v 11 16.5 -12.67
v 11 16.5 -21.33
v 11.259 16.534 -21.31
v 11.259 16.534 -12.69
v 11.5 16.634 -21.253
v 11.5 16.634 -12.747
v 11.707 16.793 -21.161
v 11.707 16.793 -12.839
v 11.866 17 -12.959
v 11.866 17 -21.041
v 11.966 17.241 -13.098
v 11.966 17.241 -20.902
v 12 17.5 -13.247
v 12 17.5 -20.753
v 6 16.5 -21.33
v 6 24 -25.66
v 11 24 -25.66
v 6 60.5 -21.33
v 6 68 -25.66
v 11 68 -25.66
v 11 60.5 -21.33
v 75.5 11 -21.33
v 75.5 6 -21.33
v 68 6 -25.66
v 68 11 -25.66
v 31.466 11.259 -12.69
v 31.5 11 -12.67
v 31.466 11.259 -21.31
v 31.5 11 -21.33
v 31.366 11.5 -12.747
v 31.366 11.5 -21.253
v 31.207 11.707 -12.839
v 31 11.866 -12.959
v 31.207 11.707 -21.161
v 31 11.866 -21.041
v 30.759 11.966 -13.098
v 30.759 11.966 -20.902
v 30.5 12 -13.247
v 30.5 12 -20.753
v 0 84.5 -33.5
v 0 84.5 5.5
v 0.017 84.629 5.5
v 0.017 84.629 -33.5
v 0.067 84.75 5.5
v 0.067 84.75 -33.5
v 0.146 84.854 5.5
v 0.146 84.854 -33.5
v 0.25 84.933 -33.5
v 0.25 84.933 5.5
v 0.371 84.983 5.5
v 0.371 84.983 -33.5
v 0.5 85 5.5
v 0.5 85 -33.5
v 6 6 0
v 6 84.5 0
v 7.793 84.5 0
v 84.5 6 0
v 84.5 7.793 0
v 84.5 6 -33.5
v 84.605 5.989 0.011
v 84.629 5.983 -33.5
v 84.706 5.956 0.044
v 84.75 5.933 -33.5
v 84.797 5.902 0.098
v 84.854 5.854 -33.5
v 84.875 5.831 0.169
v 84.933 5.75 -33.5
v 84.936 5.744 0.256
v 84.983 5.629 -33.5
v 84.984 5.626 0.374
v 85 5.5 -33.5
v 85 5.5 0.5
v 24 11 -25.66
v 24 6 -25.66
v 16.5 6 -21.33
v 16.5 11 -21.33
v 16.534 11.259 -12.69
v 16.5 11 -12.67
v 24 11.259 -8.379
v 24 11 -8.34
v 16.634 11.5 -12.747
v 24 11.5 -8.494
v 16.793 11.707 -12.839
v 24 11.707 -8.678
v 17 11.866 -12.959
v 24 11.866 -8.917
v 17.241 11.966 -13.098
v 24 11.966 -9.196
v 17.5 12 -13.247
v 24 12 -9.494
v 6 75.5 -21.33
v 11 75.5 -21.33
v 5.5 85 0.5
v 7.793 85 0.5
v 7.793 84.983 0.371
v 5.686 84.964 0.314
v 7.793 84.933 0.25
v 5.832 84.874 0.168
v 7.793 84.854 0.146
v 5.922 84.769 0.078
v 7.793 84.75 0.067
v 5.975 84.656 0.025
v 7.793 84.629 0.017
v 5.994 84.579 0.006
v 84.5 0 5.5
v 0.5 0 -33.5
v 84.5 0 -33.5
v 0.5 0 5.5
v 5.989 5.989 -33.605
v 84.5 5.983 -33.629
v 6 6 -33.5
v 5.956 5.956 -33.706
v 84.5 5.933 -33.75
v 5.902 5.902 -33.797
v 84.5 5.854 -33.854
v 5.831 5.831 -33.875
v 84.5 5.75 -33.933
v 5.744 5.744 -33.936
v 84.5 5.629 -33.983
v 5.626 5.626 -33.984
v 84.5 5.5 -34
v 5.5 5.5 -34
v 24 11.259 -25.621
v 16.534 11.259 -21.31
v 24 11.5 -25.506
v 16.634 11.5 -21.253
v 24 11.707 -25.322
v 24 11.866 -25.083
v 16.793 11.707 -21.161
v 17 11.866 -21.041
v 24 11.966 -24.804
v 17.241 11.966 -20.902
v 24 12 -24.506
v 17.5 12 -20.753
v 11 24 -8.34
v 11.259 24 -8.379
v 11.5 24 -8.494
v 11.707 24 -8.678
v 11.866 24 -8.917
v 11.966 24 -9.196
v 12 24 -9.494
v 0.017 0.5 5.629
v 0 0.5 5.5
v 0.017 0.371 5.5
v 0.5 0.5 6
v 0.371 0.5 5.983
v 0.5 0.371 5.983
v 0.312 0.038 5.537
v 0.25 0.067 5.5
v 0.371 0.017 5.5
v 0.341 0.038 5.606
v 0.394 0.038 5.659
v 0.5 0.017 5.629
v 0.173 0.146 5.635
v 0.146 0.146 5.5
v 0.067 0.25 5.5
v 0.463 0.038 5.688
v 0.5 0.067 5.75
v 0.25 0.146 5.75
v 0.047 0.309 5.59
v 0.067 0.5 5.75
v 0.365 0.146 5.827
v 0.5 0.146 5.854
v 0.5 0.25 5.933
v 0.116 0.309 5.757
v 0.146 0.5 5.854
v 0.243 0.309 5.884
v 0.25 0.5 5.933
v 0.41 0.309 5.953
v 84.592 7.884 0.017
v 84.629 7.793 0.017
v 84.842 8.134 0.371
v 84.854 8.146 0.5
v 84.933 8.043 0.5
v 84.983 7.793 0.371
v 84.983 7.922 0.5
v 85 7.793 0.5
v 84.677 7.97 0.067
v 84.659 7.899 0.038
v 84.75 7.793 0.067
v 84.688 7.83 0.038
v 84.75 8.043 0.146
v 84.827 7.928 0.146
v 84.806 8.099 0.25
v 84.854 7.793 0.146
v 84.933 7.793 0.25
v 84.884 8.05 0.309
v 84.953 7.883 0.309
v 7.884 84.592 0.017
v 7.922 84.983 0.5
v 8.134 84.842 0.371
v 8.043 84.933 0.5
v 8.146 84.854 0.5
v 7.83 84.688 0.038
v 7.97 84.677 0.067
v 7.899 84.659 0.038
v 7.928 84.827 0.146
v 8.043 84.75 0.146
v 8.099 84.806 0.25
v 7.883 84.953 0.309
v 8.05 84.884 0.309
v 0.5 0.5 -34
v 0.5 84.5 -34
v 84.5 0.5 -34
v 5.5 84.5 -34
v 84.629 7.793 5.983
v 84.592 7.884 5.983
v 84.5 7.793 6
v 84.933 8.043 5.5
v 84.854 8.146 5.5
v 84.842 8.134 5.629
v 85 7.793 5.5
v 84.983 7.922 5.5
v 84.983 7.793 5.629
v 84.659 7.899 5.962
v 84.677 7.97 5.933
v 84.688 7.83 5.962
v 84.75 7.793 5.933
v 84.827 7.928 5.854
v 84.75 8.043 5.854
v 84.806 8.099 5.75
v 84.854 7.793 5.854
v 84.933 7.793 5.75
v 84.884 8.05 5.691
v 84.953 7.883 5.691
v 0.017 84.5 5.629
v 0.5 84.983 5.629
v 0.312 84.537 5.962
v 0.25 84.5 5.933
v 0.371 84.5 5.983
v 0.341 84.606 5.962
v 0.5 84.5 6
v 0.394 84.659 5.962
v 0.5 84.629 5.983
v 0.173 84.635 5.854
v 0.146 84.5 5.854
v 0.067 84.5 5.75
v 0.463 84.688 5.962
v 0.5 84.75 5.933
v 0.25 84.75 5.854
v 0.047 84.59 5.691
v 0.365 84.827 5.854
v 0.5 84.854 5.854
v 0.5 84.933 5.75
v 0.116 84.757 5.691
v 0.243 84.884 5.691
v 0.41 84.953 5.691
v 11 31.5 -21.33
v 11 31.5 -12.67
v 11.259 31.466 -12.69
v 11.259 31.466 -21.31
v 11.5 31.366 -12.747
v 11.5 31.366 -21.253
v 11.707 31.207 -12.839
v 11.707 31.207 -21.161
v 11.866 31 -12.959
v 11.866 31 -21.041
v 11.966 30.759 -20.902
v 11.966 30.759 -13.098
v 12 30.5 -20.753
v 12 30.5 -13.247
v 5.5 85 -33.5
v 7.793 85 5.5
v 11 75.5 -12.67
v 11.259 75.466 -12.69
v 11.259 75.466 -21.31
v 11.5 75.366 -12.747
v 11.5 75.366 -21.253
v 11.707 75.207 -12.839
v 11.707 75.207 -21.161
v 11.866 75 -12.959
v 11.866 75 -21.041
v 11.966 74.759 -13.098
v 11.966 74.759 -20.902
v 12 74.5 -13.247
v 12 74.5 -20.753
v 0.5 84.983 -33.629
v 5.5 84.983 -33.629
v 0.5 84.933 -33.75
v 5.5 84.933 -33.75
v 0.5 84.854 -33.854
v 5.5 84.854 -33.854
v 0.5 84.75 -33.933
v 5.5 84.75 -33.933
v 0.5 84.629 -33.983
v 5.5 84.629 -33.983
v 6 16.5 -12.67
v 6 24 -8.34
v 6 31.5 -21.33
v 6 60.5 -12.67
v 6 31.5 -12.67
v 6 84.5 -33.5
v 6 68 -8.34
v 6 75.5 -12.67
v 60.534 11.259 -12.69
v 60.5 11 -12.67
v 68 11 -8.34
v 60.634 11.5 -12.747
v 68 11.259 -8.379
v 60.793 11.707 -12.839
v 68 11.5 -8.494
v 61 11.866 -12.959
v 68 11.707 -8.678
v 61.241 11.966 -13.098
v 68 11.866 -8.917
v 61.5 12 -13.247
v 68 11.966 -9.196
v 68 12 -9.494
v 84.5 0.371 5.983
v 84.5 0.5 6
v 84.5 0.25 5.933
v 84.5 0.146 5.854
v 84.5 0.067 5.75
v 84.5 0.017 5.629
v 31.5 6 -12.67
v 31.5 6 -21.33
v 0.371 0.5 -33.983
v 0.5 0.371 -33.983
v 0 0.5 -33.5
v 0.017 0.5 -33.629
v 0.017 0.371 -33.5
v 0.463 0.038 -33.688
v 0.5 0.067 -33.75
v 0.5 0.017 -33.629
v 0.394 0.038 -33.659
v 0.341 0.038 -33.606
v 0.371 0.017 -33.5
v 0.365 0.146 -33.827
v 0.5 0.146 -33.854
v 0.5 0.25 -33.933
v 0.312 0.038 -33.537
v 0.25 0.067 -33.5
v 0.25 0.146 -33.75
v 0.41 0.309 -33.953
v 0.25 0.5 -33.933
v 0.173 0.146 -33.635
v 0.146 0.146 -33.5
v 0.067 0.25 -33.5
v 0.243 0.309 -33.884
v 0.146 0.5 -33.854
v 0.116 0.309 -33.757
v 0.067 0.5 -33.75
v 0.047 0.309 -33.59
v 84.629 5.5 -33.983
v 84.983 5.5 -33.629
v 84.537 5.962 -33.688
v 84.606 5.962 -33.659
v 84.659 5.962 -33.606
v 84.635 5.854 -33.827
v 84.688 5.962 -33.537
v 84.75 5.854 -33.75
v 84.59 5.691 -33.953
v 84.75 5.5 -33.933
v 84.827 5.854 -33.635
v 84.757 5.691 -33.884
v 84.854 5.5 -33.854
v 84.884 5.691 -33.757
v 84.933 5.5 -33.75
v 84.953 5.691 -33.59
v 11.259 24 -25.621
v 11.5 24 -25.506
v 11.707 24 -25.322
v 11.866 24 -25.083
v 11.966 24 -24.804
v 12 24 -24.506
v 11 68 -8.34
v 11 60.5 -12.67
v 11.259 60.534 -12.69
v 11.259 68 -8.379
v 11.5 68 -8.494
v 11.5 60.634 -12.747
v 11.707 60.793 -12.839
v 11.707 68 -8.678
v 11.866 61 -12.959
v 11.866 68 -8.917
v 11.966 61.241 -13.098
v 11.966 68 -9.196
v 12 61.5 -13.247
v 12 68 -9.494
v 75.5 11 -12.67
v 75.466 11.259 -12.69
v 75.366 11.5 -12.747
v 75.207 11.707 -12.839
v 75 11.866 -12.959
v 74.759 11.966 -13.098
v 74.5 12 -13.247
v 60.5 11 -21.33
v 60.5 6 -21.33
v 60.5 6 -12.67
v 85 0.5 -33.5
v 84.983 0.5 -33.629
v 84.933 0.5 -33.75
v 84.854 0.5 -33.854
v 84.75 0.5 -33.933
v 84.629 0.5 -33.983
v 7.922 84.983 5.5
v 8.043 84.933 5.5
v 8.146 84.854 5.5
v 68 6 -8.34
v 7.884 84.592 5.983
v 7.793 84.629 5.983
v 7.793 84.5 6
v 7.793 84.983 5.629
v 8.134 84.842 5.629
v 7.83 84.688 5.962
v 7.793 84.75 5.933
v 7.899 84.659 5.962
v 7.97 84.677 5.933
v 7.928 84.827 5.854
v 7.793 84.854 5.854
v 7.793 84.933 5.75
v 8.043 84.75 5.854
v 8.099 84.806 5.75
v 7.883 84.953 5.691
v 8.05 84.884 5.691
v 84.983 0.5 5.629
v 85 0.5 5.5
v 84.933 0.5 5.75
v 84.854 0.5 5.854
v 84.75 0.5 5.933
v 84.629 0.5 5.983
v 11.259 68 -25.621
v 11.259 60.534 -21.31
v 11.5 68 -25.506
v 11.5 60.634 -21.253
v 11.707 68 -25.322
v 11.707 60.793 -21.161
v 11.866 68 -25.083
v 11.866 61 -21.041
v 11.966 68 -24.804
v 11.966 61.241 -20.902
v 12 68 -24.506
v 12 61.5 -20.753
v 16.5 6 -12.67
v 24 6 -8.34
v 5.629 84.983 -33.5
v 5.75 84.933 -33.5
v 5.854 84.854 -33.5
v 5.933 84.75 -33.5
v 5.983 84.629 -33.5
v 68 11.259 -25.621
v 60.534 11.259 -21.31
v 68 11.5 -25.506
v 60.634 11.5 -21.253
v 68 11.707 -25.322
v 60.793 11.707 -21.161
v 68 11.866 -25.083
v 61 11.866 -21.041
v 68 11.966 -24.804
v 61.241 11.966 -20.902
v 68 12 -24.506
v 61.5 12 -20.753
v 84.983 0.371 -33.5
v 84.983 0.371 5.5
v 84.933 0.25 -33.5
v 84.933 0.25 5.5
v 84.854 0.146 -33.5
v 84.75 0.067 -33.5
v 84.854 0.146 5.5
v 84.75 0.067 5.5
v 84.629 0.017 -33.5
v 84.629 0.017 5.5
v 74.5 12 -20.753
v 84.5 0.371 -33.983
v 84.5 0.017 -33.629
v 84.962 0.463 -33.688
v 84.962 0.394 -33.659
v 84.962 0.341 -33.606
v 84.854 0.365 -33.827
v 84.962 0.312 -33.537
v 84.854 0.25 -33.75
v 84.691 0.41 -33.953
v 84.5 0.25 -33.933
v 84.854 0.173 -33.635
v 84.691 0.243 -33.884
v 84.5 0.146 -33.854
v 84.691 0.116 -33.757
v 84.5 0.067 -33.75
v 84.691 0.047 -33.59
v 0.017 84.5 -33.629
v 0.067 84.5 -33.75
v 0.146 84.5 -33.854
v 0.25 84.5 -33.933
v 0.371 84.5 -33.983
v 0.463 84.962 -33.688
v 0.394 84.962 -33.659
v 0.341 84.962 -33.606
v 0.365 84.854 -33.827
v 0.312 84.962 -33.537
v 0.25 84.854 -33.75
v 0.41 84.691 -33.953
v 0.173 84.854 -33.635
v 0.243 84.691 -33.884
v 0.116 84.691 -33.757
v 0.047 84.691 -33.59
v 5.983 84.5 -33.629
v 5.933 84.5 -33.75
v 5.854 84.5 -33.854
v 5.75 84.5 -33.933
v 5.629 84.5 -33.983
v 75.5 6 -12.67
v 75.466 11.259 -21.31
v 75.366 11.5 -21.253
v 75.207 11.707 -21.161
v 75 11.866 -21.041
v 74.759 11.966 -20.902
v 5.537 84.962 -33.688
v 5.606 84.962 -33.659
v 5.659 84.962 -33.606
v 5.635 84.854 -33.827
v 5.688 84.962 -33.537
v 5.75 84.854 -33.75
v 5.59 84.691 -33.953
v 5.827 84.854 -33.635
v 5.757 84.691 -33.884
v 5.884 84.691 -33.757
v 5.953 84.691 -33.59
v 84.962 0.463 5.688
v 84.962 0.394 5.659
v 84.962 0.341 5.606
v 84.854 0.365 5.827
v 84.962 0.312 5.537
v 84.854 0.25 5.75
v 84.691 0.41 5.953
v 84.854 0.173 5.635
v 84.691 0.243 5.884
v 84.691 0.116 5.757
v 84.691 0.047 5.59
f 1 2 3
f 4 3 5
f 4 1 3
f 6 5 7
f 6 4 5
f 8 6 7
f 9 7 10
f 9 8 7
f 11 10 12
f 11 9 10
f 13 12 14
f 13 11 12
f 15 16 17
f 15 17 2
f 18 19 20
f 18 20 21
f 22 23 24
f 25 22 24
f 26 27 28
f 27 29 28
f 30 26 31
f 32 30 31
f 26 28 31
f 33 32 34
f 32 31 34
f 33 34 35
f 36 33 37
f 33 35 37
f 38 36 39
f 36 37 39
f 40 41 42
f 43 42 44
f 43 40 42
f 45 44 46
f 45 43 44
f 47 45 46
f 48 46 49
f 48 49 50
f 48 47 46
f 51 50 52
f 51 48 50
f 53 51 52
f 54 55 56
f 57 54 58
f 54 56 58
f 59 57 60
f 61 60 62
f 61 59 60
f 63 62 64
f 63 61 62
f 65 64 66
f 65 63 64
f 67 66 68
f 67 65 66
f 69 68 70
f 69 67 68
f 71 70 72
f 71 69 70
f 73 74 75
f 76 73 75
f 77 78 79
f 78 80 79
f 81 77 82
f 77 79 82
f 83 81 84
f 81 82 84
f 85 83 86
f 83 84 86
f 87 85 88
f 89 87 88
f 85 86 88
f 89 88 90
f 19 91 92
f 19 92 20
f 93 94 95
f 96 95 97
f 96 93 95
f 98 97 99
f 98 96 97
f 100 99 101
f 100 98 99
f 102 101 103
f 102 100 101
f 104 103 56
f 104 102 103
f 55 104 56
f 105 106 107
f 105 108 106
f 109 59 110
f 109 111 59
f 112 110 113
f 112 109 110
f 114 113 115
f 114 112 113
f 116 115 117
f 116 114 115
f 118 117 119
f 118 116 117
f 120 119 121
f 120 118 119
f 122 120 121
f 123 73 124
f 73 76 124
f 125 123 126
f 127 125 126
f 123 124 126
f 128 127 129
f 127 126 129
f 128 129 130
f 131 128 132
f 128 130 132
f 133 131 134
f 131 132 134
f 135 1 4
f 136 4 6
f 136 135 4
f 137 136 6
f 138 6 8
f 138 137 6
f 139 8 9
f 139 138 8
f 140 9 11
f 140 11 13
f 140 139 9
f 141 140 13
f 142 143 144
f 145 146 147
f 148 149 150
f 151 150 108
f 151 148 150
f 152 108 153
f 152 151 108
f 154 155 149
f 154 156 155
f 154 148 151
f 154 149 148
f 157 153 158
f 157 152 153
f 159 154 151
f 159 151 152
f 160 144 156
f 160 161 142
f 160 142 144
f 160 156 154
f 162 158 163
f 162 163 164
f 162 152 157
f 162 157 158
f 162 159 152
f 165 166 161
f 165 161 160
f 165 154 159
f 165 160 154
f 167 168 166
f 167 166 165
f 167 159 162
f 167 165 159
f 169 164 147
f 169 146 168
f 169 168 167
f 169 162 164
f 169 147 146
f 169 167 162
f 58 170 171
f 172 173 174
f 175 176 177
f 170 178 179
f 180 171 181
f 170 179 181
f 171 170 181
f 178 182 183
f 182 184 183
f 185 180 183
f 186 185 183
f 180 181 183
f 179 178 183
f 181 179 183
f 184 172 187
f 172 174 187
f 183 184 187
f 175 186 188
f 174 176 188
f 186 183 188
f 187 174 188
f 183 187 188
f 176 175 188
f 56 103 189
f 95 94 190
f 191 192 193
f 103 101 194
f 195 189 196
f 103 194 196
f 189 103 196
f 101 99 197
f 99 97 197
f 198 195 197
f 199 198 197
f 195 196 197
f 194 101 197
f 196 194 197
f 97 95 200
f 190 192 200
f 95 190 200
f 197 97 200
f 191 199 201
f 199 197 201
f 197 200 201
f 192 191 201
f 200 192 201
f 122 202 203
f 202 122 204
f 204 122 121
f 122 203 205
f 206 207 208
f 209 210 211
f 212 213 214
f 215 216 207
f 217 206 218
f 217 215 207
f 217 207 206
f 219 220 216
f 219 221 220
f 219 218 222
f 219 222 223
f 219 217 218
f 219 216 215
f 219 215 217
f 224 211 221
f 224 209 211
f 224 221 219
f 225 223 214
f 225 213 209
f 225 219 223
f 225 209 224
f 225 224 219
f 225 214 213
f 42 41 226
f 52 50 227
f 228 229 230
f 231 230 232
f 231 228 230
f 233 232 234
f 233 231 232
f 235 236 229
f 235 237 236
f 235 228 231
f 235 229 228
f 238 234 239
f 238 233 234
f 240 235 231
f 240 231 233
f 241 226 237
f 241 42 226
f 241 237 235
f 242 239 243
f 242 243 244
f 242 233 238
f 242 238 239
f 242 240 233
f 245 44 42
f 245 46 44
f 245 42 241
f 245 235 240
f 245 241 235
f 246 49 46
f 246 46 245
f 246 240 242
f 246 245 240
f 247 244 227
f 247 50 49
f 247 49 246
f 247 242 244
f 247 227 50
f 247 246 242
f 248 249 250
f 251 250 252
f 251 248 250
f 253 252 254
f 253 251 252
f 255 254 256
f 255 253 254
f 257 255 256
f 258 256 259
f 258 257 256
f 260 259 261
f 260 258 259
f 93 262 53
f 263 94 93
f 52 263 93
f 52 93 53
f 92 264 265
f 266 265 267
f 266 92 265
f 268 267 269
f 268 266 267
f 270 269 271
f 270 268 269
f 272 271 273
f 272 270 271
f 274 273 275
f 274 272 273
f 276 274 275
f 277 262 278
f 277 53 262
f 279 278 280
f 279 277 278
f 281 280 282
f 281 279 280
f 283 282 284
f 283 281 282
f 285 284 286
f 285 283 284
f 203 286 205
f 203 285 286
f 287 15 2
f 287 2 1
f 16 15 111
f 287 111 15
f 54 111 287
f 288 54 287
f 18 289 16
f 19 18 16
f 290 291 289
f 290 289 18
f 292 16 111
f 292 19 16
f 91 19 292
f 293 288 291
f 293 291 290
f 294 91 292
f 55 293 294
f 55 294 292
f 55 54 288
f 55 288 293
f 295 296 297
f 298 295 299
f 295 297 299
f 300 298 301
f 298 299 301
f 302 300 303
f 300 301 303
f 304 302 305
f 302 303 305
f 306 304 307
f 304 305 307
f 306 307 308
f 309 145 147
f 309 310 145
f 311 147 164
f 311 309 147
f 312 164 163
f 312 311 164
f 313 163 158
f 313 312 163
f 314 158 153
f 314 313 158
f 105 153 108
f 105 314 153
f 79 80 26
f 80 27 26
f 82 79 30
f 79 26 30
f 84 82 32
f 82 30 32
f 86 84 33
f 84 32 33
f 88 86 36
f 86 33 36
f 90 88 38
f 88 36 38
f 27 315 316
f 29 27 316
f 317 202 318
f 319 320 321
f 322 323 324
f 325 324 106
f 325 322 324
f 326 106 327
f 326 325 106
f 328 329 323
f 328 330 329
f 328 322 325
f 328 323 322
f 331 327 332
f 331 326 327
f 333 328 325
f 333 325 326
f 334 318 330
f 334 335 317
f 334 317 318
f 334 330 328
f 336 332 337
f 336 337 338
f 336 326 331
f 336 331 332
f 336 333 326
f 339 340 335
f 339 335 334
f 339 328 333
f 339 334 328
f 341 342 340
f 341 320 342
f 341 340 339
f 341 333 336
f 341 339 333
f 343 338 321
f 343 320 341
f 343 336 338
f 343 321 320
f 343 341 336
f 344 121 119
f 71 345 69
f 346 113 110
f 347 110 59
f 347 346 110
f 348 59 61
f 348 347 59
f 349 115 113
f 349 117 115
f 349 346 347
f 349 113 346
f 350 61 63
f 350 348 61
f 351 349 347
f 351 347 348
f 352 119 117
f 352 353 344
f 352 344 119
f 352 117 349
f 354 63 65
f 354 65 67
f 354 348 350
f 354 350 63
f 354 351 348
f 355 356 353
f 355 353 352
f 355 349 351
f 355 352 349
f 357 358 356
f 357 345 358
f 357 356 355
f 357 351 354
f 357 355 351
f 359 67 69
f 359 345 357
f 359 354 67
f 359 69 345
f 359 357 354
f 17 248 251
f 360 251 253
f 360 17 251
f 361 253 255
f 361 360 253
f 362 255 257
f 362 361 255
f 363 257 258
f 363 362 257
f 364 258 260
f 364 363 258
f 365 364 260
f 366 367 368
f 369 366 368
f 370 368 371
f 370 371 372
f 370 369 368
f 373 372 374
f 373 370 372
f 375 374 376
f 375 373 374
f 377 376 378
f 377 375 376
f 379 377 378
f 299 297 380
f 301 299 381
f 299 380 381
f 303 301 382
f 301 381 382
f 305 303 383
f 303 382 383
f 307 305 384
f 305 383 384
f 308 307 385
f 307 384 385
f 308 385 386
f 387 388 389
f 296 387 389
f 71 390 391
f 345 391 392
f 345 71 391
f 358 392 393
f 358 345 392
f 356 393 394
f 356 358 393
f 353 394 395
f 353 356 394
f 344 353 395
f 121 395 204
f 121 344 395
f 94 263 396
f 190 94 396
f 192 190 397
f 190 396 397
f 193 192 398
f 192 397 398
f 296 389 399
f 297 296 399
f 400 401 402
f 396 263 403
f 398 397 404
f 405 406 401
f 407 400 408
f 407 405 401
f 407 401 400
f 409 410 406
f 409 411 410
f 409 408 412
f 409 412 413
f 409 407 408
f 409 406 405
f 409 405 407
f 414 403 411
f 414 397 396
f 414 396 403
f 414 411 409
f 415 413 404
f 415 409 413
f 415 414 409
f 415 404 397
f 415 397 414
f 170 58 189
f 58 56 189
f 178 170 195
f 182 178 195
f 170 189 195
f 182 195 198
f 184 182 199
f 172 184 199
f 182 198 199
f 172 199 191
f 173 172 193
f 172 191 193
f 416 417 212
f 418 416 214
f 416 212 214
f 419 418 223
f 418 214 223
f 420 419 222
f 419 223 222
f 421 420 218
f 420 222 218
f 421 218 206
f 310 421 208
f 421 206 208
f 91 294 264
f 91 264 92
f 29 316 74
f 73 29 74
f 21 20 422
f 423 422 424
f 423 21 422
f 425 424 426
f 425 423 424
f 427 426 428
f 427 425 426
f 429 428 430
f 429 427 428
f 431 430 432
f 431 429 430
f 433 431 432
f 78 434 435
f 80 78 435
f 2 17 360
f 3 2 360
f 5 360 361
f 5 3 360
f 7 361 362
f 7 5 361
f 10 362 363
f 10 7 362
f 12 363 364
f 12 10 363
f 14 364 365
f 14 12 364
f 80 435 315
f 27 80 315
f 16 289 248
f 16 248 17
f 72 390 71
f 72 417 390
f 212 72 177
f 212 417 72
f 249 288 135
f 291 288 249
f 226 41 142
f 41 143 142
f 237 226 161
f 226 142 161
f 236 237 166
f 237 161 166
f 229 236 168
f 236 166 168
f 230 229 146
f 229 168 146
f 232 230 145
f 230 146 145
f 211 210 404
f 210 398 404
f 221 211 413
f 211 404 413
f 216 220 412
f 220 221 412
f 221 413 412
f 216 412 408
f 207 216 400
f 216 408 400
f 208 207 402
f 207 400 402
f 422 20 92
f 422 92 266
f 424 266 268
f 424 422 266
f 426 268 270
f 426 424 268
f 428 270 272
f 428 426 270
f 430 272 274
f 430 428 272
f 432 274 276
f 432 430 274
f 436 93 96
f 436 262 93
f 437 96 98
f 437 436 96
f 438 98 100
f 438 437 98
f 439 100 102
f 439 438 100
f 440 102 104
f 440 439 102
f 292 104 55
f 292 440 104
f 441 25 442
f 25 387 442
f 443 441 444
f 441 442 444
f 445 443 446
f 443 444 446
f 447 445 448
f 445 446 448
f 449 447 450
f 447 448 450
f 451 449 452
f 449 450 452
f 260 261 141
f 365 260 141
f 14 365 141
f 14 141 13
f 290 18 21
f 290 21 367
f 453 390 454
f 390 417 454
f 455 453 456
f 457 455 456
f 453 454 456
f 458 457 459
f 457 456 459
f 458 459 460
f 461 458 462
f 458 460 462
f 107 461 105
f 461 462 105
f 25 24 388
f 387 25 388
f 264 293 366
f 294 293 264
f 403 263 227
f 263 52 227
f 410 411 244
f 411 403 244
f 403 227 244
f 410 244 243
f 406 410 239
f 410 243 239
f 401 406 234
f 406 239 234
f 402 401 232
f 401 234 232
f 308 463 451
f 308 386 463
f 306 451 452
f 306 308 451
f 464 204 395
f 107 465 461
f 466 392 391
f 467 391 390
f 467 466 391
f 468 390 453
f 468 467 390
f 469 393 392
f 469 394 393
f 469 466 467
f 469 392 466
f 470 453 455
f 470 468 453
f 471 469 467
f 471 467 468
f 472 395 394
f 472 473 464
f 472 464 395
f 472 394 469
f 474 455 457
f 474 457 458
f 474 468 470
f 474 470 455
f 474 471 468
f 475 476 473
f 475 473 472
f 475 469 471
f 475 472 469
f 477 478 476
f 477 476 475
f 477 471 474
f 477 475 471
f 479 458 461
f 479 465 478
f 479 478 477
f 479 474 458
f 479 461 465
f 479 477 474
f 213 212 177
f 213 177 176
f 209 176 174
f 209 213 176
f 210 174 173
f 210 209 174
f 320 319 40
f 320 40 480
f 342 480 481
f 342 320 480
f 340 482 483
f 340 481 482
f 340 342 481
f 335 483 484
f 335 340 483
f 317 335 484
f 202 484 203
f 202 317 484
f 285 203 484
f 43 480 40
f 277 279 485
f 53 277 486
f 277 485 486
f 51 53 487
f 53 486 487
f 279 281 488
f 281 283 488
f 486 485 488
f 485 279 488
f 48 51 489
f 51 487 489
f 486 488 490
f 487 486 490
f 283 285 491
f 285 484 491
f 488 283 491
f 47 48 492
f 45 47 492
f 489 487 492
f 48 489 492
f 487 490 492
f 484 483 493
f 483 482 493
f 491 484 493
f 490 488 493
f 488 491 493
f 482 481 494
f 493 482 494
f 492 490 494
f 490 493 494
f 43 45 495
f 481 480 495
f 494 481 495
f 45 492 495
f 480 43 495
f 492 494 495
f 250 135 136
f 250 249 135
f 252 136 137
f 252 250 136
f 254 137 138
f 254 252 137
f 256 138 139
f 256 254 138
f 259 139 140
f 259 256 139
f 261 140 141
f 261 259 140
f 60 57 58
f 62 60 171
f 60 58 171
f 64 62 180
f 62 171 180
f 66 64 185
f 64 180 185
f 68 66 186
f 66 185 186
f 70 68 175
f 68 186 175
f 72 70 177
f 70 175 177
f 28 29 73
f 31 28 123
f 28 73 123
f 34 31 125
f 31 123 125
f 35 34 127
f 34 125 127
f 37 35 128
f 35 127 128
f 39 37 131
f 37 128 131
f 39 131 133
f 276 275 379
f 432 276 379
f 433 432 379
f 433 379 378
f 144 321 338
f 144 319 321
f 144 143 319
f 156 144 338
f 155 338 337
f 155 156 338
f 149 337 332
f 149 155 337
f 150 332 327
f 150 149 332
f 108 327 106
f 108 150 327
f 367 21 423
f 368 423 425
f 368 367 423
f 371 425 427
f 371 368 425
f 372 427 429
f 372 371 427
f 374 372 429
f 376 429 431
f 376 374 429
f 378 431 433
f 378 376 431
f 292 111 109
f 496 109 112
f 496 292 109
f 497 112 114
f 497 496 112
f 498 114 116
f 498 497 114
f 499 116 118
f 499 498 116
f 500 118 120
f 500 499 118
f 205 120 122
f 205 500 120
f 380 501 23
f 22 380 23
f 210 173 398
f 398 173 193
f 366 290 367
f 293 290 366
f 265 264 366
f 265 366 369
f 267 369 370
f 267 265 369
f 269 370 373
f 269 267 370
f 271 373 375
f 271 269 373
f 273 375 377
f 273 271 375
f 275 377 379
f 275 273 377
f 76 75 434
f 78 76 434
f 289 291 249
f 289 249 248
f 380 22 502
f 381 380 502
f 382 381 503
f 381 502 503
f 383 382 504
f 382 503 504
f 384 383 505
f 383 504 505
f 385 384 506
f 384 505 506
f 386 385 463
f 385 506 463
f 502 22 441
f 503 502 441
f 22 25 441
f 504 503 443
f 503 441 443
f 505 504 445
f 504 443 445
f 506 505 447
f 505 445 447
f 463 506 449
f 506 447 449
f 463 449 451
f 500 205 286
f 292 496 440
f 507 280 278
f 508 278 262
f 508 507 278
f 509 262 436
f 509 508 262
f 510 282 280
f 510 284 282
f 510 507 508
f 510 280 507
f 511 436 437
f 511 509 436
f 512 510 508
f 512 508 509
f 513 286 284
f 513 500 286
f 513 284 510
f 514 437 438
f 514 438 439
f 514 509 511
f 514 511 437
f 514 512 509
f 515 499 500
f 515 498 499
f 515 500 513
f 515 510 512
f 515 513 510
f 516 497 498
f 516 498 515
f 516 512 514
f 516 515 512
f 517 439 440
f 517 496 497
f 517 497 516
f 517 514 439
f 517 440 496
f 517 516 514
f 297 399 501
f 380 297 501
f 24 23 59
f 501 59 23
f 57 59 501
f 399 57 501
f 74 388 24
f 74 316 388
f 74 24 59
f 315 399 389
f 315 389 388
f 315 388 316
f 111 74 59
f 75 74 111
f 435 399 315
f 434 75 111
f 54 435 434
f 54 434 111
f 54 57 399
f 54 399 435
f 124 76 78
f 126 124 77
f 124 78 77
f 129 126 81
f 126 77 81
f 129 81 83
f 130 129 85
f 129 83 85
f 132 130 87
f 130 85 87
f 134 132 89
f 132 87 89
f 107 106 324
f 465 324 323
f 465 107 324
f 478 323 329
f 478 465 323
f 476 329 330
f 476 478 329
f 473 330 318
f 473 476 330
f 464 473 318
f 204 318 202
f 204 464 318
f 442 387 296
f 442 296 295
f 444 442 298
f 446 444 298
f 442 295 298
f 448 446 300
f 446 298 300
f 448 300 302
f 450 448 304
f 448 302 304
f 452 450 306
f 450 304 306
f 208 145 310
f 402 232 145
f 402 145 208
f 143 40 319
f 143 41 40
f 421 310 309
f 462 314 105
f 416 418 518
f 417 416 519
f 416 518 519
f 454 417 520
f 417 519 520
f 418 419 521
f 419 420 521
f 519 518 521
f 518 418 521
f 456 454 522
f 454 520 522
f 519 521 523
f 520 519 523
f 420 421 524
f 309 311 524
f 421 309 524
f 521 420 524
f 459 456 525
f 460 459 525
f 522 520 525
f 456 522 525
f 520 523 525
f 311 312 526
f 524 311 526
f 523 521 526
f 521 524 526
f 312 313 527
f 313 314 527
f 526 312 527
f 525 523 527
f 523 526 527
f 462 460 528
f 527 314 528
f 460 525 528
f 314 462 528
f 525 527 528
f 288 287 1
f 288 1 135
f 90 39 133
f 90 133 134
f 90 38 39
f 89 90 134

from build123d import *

# Parameters (mm, degrees)
F1_DEPTH = 6
F3_DEPTH = 34
F4_R     = 0.5
F7_DEPTH = 6
F8_R     = 1


# Not quite as in the source:
# - a pattern or mirror of a feature is missing from the dataset's text; its kind, count and spacing are read off the source's solid


with BuildPart() as f1:
    # F0 (on Top) → F1 (new body)
    with BuildSketch(Plane.XY):
        Polygon((0, 85), (0, 0), (85, 0), (85, 8), (8, 85), align=None)
    extrude(amount=F1_DEPTH)

    # F2 (on Top) → F3 (join)
    with BuildSketch(Plane.XY):
        Polygon((0, 85), (0, 0), (85, 0), (85, 6), (6, 6), (6, 85), align=None)
    extrude(amount=-F3_DEPTH)

    # F4
    f4_edges = [f1.edges().sort_by_distance(p)[0] for p in [
        (0, 42.5, -34),
        (42.5, 0, -34),
        (85, 3, -34),
        (45.5, 6, -34),
        (6, 45.5, -34),
        (3, 85, -34),
        (0, 85, -14),
        (0, 42.5, 6),
        (0, 0, -14),
        (8, 85, 3),
        (4, 85, 6),
        (6, 85, -17),
        (7, 85, 0),
        (85, 8, 3),
        (46.5, 46.5, 0),
        (46.5, 46.5, 6),
        (42.5, 0, 6),
        (85, 4, 6),
        (85, 0, -14),
        (85, 7, 0),
        (85, 6, -17),
    ]]
    fillet(f4_edges, radius=F4_R)

    # F6 (on face) → F7 (join)
    with BuildSketch(Plane(origin=(0, 6, 0), x_dir=(-1, 0, 0), z_dir=(0, 1, 0))):
        Polygon((-68, -25.6602540378), (-60.5, -21.3301270189), (-60.5, -12.6698729811), (-68, -8.3397459622), (-75.5, -12.6698729811), (-75.5, -21.3301270189), align=None)
        Polygon((-24, -25.6602540378), (-16.5, -21.3301270189), (-16.5, -12.6698729811), (-24, -8.3397459622), (-31.5, -12.6698729811), (-31.5, -21.3301270189), align=None)
    f7 = extrude(amount=F7_DEPTH)

    # F7_copies: F7 across plane
    add(f7.mirror(Plane(origin=(0, 0, 0), x_dir=(0.7071067812, 0.7071067812, 0), z_dir=(-0.7071067812, 0.7071067812, 0))))

    # F8
    f8_edges = [f1.edges().sort_by_distance(p)[0] for p in [
        (71.75, 12, -23.495191),
        (64.25, 12, -23.495191),
        (60.5, 12, -17),
        (64.25, 12, -10.504809),
        (71.75, 12, -10.504809),
        (75.5, 12, -17),
        (27.75, 12, -23.495191),
        (20.25, 12, -23.495191),
        (16.5, 12, -17),
        (20.25, 12, -10.504809),
        (27.75, 12, -10.504809),
        (31.5, 12, -17),
        (12, 31.5, -17),
        (12, 27.75, -10.504809),
        (12, 20.25, -10.504809),
        (12, 16.5, -17),
        (12, 20.25, -23.495191),
        (12, 27.75, -23.495191),
        (12, 75.5, -17),
        (12, 71.75, -10.504809),
        (12, 64.25, -10.504809),
        (12, 60.5, -17),
        (12, 64.25, -23.495191),
        (12, 71.75, -23.495191),
    ]]
    fillet(f8_edges, radius=F8_R)


solid = f1.part
